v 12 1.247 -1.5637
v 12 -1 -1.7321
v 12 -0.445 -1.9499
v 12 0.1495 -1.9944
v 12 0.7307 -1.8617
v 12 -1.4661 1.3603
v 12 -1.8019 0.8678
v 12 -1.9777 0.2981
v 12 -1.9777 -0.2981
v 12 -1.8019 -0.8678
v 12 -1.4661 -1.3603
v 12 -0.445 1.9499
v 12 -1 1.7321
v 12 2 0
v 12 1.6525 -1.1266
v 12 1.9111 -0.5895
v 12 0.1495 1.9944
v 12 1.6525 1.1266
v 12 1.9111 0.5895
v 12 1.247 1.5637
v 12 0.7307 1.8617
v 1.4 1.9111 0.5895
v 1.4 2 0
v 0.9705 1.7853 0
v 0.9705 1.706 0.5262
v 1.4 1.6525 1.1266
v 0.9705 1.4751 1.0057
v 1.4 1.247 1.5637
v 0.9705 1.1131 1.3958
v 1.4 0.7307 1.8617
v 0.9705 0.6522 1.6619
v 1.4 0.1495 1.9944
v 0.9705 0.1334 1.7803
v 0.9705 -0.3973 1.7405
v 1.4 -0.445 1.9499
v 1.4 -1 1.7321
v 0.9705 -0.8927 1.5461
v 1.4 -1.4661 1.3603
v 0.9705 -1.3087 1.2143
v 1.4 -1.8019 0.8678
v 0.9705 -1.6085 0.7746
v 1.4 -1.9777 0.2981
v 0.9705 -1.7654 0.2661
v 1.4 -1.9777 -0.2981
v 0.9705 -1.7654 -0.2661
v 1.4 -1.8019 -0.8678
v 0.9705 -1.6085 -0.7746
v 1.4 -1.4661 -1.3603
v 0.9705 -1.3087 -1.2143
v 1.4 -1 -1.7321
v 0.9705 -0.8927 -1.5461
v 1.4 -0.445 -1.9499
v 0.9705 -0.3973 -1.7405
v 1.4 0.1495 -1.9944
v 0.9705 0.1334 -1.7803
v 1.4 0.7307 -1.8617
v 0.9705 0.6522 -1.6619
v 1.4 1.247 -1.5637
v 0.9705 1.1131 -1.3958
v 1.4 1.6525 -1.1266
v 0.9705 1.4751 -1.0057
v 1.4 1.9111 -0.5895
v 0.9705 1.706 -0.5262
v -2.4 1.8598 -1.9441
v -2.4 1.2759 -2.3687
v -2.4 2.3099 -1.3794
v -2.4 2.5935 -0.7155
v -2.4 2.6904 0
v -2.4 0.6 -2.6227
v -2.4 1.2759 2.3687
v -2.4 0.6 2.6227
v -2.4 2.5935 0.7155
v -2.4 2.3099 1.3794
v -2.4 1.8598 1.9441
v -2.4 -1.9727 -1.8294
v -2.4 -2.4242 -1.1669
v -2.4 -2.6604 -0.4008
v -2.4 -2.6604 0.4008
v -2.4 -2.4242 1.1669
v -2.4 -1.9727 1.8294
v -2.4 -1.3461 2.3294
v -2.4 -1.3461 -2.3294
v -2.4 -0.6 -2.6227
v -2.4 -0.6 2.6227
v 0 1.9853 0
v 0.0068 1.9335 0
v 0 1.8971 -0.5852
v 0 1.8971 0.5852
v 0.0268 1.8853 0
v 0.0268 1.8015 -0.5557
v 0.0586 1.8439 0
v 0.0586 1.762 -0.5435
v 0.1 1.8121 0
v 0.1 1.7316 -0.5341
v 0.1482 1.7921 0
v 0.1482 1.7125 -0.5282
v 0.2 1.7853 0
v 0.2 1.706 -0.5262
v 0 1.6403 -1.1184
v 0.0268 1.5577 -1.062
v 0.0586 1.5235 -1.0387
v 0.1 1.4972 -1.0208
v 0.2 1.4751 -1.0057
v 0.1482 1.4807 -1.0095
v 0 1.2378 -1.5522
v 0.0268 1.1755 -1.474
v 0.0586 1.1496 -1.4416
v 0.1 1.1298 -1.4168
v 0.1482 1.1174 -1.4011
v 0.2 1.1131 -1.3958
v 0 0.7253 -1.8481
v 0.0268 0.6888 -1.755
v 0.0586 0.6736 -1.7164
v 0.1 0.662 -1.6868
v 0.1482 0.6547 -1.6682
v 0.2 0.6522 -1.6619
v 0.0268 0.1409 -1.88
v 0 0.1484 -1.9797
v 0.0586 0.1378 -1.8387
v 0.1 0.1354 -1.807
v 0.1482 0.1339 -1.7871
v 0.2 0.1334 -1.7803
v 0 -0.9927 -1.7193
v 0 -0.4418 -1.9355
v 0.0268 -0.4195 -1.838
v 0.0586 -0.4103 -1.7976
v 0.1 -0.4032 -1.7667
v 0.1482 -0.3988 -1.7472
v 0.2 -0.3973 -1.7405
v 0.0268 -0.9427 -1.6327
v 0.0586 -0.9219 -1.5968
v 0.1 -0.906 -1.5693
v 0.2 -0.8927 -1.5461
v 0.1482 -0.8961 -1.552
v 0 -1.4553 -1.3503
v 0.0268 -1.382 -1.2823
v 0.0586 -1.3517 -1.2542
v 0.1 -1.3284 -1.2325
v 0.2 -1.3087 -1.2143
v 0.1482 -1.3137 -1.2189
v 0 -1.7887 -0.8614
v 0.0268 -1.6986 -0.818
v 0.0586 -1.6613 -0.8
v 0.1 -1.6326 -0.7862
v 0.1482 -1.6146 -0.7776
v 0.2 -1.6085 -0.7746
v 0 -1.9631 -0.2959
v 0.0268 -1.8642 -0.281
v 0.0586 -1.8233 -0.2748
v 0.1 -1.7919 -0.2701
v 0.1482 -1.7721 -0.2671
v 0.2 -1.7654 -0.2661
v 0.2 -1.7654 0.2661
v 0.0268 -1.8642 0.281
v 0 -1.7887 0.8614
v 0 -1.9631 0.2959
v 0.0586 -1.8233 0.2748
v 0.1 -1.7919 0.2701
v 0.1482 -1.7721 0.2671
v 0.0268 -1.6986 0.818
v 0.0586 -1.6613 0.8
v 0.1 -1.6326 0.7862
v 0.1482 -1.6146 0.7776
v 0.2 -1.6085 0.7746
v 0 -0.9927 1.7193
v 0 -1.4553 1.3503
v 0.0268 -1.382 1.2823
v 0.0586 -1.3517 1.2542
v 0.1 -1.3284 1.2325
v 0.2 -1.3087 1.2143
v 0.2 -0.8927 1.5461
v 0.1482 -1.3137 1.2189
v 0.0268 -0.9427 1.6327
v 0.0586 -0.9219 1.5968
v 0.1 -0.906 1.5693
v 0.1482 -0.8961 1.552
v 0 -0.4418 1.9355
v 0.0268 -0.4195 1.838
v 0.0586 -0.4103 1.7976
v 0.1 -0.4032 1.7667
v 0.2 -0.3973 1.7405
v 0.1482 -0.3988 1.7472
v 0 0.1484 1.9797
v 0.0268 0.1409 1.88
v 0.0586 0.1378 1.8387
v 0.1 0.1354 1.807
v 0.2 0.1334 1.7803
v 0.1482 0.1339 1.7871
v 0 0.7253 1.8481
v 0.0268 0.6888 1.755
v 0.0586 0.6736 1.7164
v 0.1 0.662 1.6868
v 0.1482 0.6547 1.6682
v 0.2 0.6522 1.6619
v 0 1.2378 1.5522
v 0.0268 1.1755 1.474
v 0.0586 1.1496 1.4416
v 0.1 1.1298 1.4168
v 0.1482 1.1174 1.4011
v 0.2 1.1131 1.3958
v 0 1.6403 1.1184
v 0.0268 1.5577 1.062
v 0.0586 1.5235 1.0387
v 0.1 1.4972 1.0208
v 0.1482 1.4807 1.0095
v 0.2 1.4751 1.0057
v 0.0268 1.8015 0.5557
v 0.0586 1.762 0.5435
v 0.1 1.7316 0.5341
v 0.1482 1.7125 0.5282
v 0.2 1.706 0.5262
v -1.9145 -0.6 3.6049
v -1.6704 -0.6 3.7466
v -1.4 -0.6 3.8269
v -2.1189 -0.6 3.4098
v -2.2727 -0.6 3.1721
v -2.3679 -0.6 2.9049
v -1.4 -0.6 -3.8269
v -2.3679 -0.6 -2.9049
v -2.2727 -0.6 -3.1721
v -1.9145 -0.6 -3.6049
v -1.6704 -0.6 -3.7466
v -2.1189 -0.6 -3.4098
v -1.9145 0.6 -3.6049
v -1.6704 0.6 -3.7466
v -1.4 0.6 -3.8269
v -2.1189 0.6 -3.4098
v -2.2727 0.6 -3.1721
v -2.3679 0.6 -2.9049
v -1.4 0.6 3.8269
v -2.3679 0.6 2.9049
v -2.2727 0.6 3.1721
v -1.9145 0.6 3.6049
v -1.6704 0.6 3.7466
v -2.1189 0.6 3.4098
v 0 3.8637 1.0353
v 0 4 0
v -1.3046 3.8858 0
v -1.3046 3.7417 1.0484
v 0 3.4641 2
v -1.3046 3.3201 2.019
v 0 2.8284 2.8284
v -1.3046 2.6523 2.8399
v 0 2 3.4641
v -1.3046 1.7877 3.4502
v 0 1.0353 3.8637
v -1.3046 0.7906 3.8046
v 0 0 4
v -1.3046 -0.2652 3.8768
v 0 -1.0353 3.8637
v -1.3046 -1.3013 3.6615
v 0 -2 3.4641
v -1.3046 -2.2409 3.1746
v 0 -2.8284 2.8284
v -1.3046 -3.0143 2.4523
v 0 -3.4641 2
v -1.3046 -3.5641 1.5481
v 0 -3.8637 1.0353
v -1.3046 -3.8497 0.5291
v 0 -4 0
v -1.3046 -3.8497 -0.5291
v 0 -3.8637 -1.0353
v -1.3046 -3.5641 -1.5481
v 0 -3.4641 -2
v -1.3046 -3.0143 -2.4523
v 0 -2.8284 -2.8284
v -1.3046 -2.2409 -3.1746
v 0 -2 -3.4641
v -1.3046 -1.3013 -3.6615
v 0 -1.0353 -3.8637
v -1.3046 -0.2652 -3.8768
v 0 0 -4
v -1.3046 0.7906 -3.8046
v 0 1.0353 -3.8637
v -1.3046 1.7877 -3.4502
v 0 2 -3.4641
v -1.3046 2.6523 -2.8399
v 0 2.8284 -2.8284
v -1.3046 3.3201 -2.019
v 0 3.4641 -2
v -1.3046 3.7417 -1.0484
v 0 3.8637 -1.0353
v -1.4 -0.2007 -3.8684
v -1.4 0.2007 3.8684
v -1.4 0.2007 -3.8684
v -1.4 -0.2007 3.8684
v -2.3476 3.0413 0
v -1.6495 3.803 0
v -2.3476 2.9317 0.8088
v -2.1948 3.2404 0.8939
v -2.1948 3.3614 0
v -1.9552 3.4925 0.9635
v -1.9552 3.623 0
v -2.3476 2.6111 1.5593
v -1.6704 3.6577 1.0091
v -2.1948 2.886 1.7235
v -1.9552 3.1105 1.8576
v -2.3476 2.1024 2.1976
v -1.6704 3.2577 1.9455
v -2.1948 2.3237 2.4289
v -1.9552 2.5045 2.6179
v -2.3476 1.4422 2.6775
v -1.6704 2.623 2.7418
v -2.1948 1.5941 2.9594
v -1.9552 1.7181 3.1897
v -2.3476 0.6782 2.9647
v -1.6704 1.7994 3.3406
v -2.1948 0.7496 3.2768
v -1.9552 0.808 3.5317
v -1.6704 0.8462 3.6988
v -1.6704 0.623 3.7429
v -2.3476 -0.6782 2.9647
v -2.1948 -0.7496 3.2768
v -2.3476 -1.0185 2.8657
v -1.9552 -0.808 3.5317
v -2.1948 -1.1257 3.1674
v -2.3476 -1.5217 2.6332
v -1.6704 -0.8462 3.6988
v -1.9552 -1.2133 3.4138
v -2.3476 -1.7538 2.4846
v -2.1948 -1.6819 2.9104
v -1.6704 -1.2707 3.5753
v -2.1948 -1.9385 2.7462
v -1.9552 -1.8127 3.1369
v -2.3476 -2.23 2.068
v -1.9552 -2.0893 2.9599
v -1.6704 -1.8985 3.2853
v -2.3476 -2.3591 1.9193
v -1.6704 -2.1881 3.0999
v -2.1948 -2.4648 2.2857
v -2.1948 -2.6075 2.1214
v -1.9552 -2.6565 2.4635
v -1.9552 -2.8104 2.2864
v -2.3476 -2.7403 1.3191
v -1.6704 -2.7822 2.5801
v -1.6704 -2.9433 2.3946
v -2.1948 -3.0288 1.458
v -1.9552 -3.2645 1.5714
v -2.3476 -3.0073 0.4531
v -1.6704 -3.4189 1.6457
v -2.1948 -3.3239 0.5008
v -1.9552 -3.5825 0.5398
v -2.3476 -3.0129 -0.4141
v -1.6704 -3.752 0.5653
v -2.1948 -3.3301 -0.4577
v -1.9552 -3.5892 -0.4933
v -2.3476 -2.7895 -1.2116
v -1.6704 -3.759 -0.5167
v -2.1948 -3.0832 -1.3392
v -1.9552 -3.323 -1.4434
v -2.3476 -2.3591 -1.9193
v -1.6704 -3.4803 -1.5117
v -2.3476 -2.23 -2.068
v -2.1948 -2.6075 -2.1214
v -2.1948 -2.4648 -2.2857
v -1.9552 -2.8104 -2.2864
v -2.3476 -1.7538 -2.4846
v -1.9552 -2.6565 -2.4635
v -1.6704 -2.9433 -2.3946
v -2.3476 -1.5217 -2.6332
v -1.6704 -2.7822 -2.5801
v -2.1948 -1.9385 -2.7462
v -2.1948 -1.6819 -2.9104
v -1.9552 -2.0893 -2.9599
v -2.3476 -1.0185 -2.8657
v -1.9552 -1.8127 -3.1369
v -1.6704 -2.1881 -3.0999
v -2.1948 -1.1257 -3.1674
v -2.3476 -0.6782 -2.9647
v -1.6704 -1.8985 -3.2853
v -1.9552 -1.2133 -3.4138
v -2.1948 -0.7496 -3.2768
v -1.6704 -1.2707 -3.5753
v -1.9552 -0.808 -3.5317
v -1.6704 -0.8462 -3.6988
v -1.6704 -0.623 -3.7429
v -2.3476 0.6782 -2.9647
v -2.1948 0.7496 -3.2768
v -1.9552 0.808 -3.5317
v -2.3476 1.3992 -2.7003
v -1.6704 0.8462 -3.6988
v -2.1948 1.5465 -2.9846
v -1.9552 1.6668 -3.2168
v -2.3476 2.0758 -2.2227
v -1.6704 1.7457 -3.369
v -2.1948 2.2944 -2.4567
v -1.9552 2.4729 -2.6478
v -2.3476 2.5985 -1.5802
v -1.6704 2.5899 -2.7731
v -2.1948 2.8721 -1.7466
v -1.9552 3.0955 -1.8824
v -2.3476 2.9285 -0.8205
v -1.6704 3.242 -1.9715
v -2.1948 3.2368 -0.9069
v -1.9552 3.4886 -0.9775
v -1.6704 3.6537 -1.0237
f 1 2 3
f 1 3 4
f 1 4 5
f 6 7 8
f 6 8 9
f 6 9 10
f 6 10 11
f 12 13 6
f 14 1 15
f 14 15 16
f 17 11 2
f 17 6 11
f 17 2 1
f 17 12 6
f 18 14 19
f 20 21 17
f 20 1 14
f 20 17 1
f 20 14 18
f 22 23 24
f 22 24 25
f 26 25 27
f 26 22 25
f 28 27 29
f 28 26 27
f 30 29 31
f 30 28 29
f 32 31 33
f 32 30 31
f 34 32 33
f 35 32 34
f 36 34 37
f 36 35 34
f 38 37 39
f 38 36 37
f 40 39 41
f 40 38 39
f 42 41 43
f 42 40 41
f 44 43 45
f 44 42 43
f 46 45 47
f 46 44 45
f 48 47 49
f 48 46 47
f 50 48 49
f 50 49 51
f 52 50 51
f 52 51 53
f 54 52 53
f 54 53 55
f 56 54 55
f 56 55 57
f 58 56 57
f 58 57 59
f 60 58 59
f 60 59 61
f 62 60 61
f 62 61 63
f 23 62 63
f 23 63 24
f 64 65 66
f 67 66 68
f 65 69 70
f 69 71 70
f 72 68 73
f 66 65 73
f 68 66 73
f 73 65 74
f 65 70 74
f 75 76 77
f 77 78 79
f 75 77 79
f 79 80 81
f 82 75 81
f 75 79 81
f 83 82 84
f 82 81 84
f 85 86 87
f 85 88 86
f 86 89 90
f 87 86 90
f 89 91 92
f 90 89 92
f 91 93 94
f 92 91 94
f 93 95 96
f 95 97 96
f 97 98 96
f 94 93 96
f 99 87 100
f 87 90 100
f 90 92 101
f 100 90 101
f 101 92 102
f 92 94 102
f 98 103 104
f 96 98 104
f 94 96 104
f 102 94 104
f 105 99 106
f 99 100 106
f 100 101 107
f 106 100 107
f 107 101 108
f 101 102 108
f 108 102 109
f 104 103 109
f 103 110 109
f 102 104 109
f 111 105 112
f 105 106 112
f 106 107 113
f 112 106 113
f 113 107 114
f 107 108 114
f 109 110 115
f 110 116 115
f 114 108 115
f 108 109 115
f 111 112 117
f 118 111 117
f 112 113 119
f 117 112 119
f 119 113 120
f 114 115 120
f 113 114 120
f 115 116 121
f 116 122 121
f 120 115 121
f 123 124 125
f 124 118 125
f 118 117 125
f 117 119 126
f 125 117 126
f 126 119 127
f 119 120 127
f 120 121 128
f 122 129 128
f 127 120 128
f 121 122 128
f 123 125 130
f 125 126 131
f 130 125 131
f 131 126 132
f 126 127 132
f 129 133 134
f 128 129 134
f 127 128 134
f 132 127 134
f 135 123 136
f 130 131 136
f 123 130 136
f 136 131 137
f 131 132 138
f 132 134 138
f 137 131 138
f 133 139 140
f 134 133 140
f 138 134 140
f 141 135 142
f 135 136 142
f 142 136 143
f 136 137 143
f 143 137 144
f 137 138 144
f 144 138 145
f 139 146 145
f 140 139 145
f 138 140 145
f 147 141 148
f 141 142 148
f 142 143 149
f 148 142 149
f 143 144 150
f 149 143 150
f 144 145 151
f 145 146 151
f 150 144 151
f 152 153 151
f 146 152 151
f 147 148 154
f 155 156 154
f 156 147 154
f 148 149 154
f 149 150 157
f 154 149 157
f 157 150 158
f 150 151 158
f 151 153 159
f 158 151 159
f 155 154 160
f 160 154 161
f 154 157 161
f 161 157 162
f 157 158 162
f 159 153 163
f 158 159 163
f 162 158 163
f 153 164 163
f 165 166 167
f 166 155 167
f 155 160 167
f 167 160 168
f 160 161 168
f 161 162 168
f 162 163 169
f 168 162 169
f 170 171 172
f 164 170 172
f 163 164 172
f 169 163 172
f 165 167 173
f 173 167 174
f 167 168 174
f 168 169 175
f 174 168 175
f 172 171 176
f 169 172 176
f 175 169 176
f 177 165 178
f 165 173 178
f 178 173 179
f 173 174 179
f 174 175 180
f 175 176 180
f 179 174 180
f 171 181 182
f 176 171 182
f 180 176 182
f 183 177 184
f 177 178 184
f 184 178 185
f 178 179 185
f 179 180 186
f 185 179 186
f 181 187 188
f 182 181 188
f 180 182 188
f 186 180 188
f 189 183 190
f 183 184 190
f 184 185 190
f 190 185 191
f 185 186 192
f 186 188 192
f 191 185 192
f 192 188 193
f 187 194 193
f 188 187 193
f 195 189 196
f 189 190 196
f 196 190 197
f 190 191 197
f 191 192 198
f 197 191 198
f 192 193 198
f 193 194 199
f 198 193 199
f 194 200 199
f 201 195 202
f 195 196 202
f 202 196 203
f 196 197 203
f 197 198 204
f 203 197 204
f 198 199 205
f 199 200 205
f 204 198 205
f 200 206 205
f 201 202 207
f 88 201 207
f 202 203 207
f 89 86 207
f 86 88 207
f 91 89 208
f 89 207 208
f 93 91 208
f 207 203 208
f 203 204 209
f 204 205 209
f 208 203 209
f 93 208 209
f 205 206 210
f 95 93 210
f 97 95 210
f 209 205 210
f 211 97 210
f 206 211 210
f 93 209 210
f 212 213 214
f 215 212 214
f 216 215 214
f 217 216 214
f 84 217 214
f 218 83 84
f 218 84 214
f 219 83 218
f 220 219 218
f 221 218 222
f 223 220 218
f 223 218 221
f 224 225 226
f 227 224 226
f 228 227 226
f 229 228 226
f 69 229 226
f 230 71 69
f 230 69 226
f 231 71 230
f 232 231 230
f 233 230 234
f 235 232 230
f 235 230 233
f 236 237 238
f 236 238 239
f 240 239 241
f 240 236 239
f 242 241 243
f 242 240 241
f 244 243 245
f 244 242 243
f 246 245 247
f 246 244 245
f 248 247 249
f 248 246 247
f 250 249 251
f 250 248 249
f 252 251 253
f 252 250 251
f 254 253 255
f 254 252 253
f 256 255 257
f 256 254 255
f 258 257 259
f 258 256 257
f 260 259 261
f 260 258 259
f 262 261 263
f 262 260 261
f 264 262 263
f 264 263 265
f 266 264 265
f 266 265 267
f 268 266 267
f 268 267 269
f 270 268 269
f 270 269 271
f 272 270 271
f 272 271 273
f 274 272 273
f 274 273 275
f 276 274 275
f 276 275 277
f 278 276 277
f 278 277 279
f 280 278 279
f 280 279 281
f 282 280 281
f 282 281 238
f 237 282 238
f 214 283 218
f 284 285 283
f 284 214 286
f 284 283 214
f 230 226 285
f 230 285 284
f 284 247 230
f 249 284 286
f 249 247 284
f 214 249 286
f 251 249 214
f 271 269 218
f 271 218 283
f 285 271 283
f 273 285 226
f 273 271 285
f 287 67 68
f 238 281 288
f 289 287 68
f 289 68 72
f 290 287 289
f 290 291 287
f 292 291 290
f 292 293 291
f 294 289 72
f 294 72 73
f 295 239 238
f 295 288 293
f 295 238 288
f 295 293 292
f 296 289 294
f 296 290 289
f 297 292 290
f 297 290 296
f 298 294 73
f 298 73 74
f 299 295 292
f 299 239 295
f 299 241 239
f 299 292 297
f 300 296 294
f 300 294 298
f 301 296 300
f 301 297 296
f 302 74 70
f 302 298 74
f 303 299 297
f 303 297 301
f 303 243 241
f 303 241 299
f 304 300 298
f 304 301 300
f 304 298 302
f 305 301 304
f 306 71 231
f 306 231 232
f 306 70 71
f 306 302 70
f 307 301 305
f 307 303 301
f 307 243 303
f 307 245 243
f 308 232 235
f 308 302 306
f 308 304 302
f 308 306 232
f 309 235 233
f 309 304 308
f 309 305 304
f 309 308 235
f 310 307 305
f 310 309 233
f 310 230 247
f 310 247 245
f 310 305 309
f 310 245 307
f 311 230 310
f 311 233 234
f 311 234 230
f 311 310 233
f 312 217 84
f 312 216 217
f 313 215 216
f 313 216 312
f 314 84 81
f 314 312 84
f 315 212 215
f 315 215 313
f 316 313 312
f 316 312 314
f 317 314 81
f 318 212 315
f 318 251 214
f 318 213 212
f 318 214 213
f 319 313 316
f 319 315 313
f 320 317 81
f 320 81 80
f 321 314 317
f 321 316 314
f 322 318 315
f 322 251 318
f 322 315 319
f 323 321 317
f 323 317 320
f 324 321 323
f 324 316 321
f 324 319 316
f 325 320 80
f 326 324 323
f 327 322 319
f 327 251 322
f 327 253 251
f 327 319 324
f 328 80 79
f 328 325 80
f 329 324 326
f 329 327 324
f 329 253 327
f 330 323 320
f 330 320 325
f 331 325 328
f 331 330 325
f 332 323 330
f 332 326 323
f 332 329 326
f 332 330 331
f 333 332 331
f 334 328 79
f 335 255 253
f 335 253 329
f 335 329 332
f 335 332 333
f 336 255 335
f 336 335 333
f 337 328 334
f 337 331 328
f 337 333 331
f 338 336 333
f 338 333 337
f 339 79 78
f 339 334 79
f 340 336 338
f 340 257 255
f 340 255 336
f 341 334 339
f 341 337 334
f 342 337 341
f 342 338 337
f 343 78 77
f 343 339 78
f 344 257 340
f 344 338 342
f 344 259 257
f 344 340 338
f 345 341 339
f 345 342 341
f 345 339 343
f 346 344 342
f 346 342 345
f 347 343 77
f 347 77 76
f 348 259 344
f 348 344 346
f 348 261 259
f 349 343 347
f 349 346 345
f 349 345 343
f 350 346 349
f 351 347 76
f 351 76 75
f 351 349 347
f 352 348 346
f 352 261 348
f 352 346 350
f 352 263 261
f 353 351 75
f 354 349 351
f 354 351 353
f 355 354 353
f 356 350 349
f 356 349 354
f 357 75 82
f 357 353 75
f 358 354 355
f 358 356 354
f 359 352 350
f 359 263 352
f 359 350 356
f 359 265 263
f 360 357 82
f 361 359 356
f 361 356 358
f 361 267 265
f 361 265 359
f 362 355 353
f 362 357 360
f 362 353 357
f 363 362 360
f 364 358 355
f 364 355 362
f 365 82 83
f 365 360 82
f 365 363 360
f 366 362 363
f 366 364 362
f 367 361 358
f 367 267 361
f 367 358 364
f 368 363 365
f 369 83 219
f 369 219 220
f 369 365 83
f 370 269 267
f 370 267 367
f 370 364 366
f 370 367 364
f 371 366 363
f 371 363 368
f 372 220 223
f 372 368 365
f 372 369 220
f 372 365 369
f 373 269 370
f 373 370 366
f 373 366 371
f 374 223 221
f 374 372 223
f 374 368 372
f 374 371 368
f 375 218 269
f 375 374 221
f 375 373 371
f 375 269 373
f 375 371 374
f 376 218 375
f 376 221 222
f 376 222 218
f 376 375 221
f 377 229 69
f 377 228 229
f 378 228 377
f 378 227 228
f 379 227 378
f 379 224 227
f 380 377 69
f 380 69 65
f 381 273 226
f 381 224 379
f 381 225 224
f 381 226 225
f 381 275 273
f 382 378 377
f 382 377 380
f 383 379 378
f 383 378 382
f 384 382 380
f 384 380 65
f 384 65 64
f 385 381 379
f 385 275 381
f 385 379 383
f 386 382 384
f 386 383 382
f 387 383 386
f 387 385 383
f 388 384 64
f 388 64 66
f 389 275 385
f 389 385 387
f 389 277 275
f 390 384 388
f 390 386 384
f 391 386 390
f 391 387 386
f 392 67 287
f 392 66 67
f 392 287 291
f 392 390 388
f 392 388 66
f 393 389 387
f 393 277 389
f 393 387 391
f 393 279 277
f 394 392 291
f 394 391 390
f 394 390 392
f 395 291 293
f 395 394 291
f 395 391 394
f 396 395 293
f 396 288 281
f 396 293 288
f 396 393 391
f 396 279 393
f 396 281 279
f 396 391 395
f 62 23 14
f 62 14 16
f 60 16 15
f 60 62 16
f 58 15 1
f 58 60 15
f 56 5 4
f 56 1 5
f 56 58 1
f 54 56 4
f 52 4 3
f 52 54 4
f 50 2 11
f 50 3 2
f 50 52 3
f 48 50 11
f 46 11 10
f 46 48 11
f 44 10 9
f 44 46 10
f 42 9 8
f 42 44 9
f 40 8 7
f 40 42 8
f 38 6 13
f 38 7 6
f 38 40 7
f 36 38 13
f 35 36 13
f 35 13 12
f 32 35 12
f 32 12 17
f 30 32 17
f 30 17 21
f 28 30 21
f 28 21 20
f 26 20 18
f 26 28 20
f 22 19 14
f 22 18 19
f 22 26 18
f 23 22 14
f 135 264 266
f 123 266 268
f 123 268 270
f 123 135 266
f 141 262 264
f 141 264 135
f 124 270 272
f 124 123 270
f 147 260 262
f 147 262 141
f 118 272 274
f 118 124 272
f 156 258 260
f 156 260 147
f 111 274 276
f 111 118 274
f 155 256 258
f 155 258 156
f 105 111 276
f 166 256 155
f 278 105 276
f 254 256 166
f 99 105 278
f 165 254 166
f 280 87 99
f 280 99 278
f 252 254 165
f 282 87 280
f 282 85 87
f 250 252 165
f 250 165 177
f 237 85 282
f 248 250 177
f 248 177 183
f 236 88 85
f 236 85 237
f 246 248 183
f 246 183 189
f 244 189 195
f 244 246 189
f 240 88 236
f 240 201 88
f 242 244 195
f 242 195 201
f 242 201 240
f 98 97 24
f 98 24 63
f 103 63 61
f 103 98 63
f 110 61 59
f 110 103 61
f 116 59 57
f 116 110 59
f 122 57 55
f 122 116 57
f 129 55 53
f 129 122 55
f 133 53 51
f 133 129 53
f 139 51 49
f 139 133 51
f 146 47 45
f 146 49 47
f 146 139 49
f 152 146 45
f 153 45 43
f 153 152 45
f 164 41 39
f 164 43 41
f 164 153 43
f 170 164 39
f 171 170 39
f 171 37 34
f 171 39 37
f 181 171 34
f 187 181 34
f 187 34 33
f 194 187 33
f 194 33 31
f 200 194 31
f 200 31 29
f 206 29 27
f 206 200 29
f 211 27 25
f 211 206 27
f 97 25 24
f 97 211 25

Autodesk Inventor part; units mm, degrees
ref_plane "YZ Plane" through (0, 0, 0) normal (1, 0, 0) x (0, 1, 0)
ref_plane "XZ Plane" through (0, 0, 0) normal (0, 1, 0) x (-1, 0, 0)
sketch "Schizzo1" plane through (0, 0, 0) normal (0, 0, 1) x (1, 0, 0)
  line L0 (-2.4, 0) -> (12, 0)
  line L1 (12, 0) -> (12, 2)
  line L2 (12, 2) -> (1.4, 2)
  line L3 (1.4, 2) -> (0.9705, 1.7853)
  line L4 (0.9705, 1.7853) -> (0, 1.7853)
  line L5 (0, 1.7853) -> (0, 4)
  line L6 (-5.28, 0) -> (14.88, 0) projected
  line L7 (0, -0.8) -> (0, 4.8) projected
  line L8 (-2.4, 0) -> (-2.4, 3.79)
  line L9 (0, 4) -> (-2.4, 3.79)
  line L10 (1.4, 2) -> (0, 2) construction
  dimension "d0" = 12
  dimension "d1" = 10.6
  dimension "d2" = 0.4295
  dimension "d3" = 2.4
  dimension "d4" = 4
  dimension "d5" = 3.5705
  dimension "d9" = 8
  dimension "d10" = 5
revolve "Corpo" add sketch "Schizzo1" angle 360 about axis through (-2.4, 0, 0) along (1, 0, 0)
sketch "Schizzo2" plane through (-2.4, 0, 0) normal (-1, 0, 0) x (0, 0, 1)
  circle A0 centre (0, 0) radius 4 projected
  line L0 (0, 0) -> (0, 3.79) projected
  line L1 (-4, 0.6) -> (4, 0.6)
  line L2 (4, 0.6) -> (4, -0.6)
  line L3 (4, -0.6) -> (-4, -0.6)
  line L4 (-4, -0.6) -> (-4, 0.6)
  line L5 (-4, 0) -> (4, 0) construction
  line L6 (0, 0.6) -> (0, -0.6) construction
  dimension "d11" = 1.2
  dimension "d12" = 8
fillet "Raccordo1" radius 1.2 1 edges at (-2.4, -3.79, 0)
extrude "Intaglio" cut sketch "Schizzo2" against normal blind 1 contours A0 L3 L1 | L2 L3 A0 | A0 L1 L2 | A0 L4 L1 | L3 L4 A0
thread "Filettatura" size "M4x0.7" class "6g" standard "ISO Metric profile" length 10.6
ref_plane "Work Plane1" through (30.1625, 0, 0) normal (0, 0, -1) x (1, 0, 0)
fillet "Fillet5" radius 0.2 1 edges at (0, -1.7853, 0)
equation "\"d11\" = SBR"
equation "\"d12\" = KOD"
equation "\"d14\" = RR"
equation "\"d19\" = STI"
equation "\"d15\" = GEL"
equation "\"d41\" = R"
equation "\"d0\" = NLG"
equation "\"d1\" = GEL"
equation "\"d3\" = KOH"
equation "\"d4\" = GD"
equation "\"d5\" = BDM"
equation "\"d9\" = KOD"
equation "\"d10\" = KEWI"
equation "\"GD\" = NND"
equation "\"NLG\" = 12"
equation "\"GEL\" = 10.6"
equation "\"KOD\" = 8"
equation "\"KOH\" = 2.4"
equation "\"GAL\" = 0.61345 * PTC"
equation "\"R\" = 0.2"
equation "\"BDM\" = 3.5705"
equation "\"GUL\" = 0.61345 * PTC"
equation "\"RR\" = 1.2"
equation "\"SBR\" = 1.2"
equation "\"STI\" = 1"
equation "\"KEWI\" = 5deg"
equation "\"PTC\" = 0.7"
equation "\"THREADDIA\" = 4"
equation "\"TOA\" = 30deg"
equation "\"NND\" = 4"
equation "\"GD1\" = THREADDIA - 1.2269 * PTC"
properties part number "ISO 1580 - M4 x 12" material "Acciaio, Dolce"
